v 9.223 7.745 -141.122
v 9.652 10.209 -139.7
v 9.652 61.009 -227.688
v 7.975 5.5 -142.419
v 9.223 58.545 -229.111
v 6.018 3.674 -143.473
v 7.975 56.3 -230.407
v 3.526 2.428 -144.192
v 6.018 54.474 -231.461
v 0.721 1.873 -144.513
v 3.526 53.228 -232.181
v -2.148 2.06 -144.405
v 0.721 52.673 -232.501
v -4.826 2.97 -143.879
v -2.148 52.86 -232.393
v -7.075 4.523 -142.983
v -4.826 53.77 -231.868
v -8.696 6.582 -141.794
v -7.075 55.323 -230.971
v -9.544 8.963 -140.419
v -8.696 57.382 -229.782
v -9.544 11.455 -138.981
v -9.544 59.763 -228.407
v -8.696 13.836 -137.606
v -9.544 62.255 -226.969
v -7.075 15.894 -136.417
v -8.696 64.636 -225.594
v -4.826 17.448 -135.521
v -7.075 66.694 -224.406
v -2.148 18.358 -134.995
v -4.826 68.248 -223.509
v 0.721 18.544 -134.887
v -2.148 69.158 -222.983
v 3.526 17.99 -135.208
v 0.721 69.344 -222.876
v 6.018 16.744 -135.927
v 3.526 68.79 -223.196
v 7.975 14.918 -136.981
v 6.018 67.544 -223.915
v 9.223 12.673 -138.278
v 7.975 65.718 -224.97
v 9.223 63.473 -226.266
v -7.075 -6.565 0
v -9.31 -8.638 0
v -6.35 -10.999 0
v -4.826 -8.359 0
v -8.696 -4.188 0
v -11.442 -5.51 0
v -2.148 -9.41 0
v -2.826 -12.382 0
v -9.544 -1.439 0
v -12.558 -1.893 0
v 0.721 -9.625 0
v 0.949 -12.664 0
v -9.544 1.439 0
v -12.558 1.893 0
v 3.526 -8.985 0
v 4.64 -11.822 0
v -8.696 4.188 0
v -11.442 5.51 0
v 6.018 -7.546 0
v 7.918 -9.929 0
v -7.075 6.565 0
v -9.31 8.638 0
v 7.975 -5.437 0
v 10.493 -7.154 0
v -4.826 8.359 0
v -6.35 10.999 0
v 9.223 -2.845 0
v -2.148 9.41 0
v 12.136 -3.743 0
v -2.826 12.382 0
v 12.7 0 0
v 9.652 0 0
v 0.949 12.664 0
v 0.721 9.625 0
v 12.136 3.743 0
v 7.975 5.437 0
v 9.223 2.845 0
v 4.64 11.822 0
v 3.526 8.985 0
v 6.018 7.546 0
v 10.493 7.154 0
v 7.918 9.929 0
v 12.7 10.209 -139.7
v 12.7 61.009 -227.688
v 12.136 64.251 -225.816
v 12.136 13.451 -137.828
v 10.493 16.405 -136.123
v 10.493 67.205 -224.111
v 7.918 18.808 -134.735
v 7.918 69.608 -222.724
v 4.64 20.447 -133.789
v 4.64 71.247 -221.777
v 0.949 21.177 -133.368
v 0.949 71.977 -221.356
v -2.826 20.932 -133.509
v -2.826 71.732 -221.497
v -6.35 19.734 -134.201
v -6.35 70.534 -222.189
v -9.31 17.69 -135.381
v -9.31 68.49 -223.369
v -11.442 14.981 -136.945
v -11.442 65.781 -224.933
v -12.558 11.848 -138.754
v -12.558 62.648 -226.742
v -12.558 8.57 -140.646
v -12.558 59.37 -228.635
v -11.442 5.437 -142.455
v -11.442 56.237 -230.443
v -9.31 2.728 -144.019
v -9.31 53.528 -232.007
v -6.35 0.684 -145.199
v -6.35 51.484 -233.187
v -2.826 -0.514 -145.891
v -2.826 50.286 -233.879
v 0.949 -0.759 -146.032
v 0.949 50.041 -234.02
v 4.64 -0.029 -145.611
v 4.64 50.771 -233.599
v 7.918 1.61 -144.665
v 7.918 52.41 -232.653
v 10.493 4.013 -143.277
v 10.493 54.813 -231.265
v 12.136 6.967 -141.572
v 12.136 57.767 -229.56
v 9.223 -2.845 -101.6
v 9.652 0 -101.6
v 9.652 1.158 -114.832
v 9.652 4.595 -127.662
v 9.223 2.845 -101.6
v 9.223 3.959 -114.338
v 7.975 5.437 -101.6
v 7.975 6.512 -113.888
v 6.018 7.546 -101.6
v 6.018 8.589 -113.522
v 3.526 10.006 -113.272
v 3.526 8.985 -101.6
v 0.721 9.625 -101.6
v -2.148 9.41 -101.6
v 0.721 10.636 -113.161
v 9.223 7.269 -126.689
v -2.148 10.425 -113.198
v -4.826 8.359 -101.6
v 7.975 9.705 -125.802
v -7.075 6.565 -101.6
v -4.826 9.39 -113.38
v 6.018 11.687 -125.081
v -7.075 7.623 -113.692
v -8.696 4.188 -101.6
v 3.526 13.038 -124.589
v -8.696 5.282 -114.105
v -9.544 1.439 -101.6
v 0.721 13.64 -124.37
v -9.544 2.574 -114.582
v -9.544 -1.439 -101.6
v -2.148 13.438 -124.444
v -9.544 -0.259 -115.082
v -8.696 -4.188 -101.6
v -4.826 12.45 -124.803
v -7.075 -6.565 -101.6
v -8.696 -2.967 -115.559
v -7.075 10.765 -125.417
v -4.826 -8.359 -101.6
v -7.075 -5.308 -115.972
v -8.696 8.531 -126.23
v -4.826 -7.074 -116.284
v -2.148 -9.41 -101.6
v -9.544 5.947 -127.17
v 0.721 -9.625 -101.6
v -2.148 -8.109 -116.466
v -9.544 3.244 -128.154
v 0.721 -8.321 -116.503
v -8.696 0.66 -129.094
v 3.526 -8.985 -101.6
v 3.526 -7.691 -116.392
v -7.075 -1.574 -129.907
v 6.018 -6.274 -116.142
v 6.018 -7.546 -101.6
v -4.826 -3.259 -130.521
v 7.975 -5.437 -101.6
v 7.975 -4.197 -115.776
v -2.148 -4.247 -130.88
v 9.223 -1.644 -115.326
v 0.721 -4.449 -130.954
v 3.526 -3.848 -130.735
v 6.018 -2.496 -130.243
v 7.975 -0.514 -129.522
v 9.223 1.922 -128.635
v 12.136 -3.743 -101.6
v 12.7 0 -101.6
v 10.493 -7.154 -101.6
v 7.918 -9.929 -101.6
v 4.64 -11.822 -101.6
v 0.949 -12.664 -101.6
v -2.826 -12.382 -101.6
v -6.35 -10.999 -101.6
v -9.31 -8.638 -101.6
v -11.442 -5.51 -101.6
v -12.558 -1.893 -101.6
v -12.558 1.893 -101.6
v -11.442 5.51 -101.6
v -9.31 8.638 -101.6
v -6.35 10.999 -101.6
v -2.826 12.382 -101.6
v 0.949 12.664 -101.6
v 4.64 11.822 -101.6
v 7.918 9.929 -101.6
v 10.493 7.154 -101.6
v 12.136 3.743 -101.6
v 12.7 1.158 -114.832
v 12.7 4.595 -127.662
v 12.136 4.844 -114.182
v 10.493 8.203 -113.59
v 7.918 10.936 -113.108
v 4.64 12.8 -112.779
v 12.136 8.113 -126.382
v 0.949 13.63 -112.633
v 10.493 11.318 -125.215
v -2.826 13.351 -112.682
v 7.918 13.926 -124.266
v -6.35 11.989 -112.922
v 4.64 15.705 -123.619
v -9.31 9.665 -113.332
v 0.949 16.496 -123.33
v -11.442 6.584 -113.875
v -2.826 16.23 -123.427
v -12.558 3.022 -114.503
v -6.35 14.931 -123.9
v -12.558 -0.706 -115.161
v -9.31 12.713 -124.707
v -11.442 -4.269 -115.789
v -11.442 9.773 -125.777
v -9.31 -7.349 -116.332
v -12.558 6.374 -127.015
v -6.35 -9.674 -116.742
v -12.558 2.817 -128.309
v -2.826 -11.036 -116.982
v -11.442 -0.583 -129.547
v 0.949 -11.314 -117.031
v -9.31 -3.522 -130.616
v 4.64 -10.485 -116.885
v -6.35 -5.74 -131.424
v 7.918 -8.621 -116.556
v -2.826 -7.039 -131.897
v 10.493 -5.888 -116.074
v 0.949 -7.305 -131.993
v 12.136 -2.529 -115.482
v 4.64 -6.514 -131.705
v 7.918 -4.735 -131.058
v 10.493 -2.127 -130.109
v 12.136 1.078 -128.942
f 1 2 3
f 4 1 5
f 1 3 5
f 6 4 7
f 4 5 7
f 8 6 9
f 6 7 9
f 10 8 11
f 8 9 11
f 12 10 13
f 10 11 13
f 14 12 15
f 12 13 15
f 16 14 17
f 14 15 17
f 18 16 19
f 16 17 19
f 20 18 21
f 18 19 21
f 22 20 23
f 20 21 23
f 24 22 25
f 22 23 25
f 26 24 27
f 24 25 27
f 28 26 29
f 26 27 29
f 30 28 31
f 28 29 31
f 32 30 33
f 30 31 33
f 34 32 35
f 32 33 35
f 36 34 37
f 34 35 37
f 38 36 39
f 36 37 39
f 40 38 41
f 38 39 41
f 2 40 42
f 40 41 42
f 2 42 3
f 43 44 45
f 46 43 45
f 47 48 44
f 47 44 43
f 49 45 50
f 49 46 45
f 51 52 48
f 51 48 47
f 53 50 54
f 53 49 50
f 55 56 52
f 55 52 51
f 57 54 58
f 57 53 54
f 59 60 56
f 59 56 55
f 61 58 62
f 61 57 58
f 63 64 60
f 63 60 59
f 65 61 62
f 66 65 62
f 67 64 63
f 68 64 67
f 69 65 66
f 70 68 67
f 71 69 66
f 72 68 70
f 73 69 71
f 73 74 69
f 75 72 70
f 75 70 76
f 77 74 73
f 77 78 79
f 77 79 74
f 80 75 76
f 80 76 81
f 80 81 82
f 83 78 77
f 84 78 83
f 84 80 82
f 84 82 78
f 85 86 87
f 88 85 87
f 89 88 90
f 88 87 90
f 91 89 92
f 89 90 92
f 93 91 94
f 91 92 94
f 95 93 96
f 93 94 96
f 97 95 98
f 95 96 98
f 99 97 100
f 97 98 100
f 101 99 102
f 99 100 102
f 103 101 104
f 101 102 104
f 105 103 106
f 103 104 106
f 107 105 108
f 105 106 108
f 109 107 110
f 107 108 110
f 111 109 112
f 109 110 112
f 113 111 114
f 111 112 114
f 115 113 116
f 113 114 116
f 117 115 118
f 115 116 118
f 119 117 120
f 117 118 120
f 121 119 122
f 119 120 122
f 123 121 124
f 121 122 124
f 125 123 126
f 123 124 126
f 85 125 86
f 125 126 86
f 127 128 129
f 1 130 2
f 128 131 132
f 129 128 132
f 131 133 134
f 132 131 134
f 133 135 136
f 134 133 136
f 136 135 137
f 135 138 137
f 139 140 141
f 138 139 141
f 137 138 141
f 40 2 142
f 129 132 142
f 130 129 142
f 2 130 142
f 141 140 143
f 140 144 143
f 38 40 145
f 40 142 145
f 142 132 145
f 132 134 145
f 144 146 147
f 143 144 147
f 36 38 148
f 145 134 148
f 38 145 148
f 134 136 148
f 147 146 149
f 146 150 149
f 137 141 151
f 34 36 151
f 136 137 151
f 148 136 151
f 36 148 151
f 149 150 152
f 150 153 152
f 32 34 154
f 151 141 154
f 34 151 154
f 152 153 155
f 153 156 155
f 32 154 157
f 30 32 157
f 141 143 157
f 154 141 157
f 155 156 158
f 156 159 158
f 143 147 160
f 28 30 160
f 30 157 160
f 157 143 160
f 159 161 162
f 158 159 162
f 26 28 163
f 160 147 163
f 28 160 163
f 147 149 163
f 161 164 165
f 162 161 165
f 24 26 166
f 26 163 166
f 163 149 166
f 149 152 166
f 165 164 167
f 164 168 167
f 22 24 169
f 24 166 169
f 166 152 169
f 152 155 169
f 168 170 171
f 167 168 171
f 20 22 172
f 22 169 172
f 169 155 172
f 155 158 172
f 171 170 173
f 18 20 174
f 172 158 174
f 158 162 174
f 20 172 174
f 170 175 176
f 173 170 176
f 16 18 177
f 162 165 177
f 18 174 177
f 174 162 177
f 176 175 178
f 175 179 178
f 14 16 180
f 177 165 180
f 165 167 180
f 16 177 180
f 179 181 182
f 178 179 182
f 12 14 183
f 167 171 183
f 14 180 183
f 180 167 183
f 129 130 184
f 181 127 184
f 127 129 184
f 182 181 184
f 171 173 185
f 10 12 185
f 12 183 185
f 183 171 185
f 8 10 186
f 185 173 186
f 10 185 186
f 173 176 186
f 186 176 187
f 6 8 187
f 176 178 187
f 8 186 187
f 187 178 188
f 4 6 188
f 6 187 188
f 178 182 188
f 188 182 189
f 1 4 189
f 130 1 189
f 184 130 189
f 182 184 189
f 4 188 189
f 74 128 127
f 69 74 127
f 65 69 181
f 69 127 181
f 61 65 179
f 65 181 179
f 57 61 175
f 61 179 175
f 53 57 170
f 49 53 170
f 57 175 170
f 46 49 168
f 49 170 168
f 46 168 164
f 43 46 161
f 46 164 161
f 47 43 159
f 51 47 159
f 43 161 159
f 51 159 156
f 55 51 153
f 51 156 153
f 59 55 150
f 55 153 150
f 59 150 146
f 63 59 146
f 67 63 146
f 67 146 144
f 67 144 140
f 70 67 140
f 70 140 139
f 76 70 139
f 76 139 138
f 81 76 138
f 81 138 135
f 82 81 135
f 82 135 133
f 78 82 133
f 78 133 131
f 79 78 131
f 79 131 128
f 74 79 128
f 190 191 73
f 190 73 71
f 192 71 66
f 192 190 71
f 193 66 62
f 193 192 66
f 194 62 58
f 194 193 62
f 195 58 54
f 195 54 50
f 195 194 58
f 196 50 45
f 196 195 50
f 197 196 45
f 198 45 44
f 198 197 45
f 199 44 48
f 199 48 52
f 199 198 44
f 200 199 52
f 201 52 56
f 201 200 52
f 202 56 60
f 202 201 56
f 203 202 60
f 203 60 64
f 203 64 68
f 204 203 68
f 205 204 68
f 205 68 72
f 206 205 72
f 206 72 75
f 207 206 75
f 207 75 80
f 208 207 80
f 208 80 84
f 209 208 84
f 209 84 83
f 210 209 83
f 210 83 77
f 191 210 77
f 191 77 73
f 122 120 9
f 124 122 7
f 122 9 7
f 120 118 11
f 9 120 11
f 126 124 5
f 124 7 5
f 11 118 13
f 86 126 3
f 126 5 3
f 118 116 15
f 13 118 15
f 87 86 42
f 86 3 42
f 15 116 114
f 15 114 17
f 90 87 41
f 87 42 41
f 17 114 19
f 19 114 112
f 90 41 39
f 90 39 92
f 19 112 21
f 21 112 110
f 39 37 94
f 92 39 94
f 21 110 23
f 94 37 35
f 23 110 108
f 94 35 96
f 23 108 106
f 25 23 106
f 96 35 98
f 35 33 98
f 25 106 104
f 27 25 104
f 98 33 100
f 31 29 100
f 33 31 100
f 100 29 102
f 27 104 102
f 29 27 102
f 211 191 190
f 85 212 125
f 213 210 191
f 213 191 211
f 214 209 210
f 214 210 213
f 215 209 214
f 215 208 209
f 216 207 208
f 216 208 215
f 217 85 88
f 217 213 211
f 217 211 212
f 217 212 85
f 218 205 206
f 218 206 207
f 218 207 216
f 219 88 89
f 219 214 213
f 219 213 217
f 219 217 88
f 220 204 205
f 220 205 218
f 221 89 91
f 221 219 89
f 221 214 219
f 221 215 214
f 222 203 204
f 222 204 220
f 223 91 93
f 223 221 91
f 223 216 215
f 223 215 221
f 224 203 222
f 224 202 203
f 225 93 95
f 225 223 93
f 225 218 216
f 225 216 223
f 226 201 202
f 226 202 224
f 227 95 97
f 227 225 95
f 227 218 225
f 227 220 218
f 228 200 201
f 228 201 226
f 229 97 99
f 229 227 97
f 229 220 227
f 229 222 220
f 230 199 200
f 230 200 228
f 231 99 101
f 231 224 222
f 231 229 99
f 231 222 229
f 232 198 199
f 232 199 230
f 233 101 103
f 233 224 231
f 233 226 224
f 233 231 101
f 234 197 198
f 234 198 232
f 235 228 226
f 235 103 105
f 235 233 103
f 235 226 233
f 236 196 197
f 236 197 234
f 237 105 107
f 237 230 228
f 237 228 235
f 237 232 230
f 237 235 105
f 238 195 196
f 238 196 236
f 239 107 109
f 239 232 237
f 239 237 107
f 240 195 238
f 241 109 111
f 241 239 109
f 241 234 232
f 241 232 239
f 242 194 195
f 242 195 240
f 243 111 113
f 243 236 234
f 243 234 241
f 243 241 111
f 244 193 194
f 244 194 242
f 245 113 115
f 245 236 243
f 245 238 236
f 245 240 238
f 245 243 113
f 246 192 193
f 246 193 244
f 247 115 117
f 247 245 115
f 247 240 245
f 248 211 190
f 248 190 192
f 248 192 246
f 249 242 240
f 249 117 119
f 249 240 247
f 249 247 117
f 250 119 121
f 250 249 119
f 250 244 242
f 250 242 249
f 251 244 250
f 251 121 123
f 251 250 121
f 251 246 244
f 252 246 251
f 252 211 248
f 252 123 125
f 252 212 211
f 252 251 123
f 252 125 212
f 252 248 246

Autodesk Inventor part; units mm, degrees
ref_plane "YZ Plane" through (0, 0, 0) normal (1, 0, 0) x (0, 1, 0)
ref_plane "XZ Plane" through (0, 0, 0) normal (0, 1, 0) x (-1, 0, 0)
ref_plane "XY Plane" through (0, 0, 0) normal (0, 0, 1) x (1, 0, 0)
sketch "Sketch1" plane through (0, 0, 0) normal (1, 0, 0) x (0, 1, 0)
  line L0 (0, 0) -> (0, -101.6)
  arc A0 (0, -101.6) -> (10.2089, -139.7) centre (76.2, -101.6) ccw
  line L1 (10.2089, -139.7) -> (61.0089, -227.6882)
  dimension "bendAngleSketch" = 150
  dimension "CLR" = 76.2
  dimension "ST" = 101.6
sketch "Sketch2" plane through (0, 0, 0) normal (0, 0, 1) x (1, 0, 0)
  circle A0 centre (0, 0) radius 12.7
  circle A1 centre (0, 0) radius 9.652
  dimension "outerDiameter" = 25.4
  dimension "wallThickness" = 3.048
sweep "Sweep1" add profiles "Sketch2" path "Sketch1"
equation "\"bendAngle\" = 30deg"
properties part number "TB11GA1330"
